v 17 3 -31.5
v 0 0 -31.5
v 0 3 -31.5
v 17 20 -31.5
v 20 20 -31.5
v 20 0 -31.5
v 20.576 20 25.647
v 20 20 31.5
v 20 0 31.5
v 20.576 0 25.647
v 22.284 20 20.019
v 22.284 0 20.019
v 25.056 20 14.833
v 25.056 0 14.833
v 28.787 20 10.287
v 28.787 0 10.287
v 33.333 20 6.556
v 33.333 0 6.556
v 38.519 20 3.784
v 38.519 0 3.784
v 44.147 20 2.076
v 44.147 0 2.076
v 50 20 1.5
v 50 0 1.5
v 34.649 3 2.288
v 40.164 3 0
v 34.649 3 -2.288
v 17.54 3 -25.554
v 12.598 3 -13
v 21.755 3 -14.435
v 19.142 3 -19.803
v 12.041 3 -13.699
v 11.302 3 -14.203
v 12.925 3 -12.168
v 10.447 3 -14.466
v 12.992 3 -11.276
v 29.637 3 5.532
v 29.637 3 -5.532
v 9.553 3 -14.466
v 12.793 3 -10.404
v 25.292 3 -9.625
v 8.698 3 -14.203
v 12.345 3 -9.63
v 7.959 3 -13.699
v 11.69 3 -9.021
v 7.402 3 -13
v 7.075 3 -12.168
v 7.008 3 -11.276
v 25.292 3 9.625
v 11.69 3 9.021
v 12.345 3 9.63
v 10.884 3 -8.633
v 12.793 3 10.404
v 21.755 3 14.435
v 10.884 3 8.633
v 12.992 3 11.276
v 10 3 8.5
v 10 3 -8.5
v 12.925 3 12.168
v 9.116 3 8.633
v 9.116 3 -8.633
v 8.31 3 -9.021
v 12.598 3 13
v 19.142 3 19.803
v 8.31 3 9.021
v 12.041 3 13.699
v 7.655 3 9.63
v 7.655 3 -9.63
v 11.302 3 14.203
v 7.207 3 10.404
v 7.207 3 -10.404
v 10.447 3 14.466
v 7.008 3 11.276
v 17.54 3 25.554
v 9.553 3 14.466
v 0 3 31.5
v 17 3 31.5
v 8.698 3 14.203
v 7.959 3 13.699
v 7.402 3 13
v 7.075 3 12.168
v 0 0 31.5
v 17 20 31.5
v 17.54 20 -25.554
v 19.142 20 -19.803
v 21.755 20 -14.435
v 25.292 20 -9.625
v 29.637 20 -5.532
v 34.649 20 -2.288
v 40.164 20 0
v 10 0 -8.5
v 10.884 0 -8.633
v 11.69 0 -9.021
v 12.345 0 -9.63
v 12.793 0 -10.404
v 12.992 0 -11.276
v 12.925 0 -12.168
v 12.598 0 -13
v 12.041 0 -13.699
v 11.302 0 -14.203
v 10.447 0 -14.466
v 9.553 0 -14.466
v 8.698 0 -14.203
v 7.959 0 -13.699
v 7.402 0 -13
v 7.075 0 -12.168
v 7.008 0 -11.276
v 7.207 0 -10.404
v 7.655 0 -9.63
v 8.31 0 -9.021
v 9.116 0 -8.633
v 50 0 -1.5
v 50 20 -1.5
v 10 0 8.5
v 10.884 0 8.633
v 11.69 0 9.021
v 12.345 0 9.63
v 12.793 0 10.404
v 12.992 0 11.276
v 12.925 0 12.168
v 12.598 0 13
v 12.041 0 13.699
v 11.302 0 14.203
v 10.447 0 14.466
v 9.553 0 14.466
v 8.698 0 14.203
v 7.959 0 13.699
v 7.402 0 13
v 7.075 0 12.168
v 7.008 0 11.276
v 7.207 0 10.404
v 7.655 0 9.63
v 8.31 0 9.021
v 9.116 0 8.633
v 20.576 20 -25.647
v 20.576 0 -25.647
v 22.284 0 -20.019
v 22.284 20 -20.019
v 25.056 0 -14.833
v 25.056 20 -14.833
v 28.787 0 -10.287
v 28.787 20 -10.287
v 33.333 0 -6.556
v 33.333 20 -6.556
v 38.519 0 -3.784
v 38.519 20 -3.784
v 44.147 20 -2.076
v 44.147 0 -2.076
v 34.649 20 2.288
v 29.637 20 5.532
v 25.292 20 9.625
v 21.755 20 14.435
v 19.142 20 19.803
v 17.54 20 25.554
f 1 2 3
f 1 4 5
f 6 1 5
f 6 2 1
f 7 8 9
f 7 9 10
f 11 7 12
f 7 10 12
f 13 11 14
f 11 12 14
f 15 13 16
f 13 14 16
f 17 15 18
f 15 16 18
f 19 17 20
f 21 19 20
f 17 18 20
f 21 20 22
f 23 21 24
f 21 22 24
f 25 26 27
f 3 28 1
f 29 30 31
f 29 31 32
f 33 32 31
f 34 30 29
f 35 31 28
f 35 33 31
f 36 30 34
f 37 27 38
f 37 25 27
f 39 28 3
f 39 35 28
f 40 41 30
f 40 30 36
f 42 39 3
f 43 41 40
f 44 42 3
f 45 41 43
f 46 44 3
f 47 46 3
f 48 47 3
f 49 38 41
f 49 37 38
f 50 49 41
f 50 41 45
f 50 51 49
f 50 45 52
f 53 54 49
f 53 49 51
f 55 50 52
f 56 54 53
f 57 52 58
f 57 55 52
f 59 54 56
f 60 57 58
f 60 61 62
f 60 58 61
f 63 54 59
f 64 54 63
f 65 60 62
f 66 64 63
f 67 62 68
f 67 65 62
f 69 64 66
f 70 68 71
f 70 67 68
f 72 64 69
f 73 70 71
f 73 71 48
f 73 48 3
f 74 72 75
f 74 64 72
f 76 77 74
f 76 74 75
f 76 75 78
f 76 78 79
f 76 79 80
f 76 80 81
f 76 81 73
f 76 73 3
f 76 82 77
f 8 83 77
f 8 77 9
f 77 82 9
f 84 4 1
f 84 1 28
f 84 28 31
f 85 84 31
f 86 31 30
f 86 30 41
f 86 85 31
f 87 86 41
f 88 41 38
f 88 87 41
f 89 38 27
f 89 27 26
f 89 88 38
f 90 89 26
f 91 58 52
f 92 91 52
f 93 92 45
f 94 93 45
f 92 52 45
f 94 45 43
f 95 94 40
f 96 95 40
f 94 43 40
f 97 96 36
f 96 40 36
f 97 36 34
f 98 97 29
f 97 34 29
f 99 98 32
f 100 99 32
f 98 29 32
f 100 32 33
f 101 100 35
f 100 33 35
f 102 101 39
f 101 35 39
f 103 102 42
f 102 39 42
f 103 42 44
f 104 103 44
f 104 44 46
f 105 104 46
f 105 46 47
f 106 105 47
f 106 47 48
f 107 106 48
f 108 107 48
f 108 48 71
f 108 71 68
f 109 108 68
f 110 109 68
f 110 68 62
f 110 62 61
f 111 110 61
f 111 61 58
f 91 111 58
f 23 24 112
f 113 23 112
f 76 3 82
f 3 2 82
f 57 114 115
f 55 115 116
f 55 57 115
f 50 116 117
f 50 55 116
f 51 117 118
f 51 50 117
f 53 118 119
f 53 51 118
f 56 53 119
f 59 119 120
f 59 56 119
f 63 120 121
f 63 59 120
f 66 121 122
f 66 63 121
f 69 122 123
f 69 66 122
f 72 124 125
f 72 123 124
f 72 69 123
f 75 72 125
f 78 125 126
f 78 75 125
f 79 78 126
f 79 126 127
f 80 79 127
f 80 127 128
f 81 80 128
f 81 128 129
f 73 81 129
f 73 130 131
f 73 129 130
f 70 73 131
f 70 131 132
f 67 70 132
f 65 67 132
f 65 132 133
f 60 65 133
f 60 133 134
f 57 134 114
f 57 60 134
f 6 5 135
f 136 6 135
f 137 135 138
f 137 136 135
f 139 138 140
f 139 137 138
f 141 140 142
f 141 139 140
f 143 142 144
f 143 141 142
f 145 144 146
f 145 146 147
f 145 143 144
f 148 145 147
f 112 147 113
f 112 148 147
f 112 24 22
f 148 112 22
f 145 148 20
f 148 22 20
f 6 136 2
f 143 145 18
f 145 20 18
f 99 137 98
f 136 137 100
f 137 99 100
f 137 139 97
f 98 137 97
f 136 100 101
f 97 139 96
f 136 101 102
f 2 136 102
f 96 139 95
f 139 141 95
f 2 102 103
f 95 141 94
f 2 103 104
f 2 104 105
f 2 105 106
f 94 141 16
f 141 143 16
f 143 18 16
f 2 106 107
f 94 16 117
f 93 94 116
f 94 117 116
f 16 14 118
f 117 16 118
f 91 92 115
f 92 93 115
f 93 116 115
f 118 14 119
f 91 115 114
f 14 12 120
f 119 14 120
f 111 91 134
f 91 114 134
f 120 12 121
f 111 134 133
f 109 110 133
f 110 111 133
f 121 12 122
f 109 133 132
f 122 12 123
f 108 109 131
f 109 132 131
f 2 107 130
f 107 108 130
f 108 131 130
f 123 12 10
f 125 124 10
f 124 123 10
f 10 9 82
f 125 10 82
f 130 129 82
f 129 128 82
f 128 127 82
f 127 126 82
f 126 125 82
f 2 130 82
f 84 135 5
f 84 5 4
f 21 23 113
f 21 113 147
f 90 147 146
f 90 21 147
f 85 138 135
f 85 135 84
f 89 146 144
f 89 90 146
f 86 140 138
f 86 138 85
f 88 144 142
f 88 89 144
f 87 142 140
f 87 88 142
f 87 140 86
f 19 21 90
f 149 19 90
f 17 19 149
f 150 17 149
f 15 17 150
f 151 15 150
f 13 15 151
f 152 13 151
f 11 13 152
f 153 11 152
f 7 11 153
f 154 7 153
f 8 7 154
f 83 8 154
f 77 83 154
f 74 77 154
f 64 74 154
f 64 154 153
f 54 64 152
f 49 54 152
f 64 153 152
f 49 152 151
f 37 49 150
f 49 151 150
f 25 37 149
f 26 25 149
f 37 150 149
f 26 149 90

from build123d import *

# Parameters (mm, degrees)
EXTRUDE_1_DEPTH     = 20
CUT_EXTRUDE_1_DEPTH = 17
SKETCH_4_R          = 3
CUT_EXTRUDE_2_DEPTH = 62.491869381


with BuildPart() as part:
    # 草圖2 → 填料-伸長1 (new body)
    with BuildSketch(Plane(origin=(0, 0, 0), x_dir=(1, 0, 0), z_dir=(0, 1, 0))):
        with BuildLine():
            Line((0, 31.5), (20, 31.5))
            ThreePointArc((20, 31.5), (28.786796564, 10.286796564), (50, 1.5))
            Line((50, 1.5), (50, 0))
            Line((50, 0), (0, 0))
            Line((0, 0), (0, 31.5))
        make_face()
    extrude_1 = extrude(amount=EXTRUDE_1_DEPTH)

    # 草圖3 → 除料-伸長1 (cut)
    with BuildSketch(Plane(origin=(0, 20, 0), x_dir=(1, 0, 0), z_dir=(0, 1, 0))):
        with BuildLine():
            Line((0, 31.5), (17, 31.5))
            ThreePointArc((17, 31.5), (23.414353431, 11.949977071), (40.163842214, 0))
            Line((40.163842214, 0), (0, 0))
            Line((0, 0), (0, 31.5))
        make_face()
    cut_extrude_1 = extrude(amount=-CUT_EXTRUDE_1_DEPTH, mode=Mode.SUBTRACT)

    # 草圖4 → 除料-伸長2 (cut, through all)
    with BuildSketch(Plane(origin=(0, 3, 0), x_dir=(1, 0, 0), z_dir=(0, 1, 0))):
        with Locations(Location((10, 11.5, 0), (0, 0, 270))):
            Circle(SKETCH_4_R)
    cut_extrude_2 = extrude(amount=-CUT_EXTRUDE_2_DEPTH, mode=Mode.SUBTRACT)

    # 鏡射4: 填料-伸長1, 除料-伸長1, 除料-伸長2 across plane
    add(extrude_1.mirror(Plane.XY))
    add(cut_extrude_1.mirror(Plane.XY), mode=Mode.SUBTRACT)
    add(cut_extrude_2.mirror(Plane.XY), mode=Mode.SUBTRACT)


solid = part.part
